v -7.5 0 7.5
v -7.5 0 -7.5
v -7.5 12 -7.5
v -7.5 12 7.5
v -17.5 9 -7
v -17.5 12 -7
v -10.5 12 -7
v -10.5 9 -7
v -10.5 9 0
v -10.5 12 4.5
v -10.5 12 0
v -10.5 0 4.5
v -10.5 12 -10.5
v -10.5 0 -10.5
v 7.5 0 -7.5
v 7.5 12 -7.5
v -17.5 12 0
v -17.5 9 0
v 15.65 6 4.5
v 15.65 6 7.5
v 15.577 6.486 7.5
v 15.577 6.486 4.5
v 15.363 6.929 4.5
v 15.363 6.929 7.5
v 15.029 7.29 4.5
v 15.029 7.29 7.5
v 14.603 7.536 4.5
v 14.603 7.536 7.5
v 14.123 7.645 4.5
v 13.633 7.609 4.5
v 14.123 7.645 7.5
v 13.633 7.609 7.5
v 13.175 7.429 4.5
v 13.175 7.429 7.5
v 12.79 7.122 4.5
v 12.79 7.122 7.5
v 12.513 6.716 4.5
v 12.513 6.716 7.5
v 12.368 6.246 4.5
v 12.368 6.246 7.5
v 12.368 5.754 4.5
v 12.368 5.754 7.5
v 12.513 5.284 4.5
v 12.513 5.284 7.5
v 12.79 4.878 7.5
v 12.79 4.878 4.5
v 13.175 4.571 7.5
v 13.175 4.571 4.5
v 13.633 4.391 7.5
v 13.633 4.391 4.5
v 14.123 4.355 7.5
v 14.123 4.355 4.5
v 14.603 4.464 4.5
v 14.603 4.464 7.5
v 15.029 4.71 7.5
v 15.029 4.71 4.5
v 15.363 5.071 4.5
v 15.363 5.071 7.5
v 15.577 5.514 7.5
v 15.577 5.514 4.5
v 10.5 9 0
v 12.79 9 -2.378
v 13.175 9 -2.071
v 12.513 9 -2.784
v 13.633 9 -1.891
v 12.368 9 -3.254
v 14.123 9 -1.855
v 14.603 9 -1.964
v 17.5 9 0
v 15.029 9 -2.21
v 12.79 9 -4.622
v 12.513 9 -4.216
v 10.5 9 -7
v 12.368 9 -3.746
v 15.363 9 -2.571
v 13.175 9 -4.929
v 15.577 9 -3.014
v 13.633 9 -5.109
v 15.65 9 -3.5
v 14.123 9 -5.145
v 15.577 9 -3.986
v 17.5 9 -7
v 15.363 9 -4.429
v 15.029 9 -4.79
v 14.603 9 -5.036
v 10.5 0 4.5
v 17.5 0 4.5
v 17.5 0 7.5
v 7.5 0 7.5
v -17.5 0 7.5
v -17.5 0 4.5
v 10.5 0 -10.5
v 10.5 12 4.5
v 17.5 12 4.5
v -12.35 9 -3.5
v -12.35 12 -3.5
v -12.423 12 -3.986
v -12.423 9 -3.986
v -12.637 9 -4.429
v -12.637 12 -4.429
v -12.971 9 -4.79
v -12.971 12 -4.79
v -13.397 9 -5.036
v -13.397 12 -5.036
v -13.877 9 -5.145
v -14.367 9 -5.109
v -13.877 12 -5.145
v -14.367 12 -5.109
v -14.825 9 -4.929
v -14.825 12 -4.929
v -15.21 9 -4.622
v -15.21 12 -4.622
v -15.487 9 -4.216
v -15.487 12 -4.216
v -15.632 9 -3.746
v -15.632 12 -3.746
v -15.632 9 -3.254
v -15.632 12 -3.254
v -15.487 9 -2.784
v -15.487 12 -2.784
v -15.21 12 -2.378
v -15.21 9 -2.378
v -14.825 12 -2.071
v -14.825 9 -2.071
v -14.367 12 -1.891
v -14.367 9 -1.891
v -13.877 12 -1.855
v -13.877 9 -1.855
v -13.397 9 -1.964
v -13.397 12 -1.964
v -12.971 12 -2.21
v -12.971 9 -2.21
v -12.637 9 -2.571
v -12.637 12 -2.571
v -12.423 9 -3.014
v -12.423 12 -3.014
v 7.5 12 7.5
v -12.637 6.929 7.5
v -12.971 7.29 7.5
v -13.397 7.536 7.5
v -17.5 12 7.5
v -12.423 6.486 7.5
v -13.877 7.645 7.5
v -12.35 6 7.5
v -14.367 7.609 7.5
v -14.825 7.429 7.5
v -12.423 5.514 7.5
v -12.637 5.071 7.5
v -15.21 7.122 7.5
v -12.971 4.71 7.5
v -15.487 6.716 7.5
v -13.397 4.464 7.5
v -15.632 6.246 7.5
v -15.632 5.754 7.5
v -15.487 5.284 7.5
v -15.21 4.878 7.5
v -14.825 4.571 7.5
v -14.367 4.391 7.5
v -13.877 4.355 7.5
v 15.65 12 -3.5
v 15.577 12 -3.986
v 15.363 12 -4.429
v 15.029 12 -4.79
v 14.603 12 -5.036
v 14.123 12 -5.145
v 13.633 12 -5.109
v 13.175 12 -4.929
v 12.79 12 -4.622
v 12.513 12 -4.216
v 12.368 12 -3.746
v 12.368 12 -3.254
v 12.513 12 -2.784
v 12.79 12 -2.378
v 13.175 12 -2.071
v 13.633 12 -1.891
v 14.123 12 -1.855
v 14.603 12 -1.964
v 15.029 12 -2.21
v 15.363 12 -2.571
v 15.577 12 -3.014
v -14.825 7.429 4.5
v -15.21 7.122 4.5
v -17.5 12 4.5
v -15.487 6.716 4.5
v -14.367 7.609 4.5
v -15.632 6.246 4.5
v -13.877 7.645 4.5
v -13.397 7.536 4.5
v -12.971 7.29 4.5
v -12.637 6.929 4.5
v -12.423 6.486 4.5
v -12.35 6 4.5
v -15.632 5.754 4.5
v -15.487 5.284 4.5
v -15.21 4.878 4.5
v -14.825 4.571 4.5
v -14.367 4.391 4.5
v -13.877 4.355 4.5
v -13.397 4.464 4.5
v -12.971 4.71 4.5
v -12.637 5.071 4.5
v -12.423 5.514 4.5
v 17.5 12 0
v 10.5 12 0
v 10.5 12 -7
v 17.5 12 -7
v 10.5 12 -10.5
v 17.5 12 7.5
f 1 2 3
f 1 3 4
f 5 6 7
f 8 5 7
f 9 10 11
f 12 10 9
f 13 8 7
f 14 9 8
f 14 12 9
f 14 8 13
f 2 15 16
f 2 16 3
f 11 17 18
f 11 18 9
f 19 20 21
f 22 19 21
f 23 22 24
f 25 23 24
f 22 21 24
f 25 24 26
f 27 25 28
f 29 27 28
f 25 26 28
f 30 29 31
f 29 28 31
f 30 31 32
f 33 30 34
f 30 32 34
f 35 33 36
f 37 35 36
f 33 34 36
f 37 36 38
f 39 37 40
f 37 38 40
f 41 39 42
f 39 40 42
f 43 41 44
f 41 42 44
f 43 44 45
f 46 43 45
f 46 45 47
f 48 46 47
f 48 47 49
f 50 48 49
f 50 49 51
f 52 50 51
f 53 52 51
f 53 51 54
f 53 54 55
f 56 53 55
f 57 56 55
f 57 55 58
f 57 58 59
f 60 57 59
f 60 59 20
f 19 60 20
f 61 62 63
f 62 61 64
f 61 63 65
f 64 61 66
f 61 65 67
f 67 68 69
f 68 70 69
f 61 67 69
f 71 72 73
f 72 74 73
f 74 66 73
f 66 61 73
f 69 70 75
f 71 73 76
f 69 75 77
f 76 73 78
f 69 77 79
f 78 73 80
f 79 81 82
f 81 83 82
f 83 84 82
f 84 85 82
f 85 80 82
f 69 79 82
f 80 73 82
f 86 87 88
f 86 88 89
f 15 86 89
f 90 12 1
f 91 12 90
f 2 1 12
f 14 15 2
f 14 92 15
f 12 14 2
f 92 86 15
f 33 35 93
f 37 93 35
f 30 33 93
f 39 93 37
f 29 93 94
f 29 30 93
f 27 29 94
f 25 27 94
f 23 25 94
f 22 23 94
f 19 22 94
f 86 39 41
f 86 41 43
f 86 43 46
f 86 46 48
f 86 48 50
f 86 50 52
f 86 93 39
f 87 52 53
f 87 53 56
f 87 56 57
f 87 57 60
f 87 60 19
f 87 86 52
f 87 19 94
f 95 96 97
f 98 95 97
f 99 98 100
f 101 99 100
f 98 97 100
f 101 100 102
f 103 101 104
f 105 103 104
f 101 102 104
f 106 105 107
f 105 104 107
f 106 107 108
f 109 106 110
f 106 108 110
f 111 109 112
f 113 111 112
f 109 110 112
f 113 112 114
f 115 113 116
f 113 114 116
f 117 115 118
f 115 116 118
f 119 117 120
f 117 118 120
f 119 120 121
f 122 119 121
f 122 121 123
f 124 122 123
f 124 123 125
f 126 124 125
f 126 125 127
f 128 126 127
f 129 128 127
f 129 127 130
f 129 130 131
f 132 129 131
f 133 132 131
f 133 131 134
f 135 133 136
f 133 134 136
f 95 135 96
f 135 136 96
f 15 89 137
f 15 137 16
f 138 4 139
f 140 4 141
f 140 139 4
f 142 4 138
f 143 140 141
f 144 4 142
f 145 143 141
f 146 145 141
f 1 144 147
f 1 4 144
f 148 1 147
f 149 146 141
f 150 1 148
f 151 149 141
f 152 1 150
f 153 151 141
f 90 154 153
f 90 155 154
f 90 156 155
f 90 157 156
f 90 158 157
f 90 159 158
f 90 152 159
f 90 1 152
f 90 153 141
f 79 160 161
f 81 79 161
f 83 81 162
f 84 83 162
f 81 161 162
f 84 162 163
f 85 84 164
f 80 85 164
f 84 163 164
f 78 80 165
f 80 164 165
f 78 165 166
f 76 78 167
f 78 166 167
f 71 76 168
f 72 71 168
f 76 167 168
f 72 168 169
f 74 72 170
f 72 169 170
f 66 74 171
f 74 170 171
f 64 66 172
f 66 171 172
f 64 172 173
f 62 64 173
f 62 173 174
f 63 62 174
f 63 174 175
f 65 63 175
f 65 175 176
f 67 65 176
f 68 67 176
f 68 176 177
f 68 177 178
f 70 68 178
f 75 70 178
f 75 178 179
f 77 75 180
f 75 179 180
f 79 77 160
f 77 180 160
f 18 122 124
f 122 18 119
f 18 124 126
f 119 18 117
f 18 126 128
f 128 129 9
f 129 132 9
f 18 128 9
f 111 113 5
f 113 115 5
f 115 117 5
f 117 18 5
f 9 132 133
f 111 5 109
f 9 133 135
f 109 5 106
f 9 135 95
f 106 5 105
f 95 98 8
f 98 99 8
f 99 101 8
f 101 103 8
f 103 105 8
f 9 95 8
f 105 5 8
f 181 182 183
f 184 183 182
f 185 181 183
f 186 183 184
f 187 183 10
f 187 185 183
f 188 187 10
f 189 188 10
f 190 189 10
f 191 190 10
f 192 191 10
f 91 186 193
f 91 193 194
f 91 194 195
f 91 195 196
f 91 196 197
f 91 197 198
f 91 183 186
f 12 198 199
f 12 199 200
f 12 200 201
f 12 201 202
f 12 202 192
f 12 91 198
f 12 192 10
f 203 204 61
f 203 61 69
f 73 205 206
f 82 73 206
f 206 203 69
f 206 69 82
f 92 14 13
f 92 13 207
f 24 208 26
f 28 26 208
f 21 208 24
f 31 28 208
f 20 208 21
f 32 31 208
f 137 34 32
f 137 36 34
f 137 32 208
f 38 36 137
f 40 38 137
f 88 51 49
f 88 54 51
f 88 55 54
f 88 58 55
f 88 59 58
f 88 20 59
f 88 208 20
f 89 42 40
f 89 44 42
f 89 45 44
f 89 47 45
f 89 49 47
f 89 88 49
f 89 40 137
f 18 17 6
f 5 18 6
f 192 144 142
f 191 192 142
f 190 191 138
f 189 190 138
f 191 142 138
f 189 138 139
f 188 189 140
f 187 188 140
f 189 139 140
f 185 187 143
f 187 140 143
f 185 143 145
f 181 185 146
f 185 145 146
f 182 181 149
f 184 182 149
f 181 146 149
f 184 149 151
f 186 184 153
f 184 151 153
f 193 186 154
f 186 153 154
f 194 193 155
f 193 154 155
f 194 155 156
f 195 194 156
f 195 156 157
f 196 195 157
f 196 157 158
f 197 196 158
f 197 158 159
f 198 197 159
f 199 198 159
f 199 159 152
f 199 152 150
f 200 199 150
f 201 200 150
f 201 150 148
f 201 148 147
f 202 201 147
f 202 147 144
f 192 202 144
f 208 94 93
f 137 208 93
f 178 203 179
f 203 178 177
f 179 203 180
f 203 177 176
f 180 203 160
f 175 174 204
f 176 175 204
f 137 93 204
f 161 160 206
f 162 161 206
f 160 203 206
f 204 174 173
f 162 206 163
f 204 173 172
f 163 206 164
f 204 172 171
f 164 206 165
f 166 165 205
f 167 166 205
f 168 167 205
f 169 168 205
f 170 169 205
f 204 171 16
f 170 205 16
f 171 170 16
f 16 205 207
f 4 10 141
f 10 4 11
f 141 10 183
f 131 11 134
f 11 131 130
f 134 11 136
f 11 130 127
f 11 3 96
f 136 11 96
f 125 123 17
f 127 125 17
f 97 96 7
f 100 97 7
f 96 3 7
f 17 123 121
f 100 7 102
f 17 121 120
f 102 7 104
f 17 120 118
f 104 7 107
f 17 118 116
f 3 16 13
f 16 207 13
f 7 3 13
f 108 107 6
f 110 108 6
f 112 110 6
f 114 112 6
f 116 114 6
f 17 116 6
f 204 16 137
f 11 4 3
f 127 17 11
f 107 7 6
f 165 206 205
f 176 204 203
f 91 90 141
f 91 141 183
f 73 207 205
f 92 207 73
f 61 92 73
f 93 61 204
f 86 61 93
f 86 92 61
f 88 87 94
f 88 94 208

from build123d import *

# Parameters (mm, degrees)
BOSS_EXTRUDE1_DEPTH = 12
SKETCH2_R           = 1.65
CUT_EXTRUDE1_DEPTH  = 12
SKETCH3_W           = 7
SKETCH3_H           = 7
SKETCH3_R           = 1.65
BOSS_EXTRUDE2_DEPTH = 3


with BuildPart() as part:
    # Sketch1 → Boss-Extrude1 (new body)
    with BuildSketch(Plane(origin=(0, 0, 0), x_dir=(1, 0, 0), z_dir=(0, 1, 0))):
        Polygon((7.5, -7.5), (7.5, 7.5), (-7.5, 7.5), (-7.5, -7.5), (-17.5, -7.5), (-17.5, -4.5), (-10.5, -4.5), (-10.5, 10.5), (10.5, 10.5), (10.5, -4.5), (17.5, -4.5), (17.5, -7.5), align=None)
    extrude(amount=BOSS_EXTRUDE1_DEPTH)

    # Sketch2 → Cut-Extrude1 (cut)
    with BuildSketch(Plane.XY.offset(7.5)):
        with Locations((-14, 6)):
            Circle(SKETCH2_R)
        with Locations((14, 6)):
            Circle(SKETCH2_R)
    extrude(amount=-CUT_EXTRUDE1_DEPTH, mode=Mode.SUBTRACT)

    # Sketch3 → Boss-Extrude2 (add)
    with BuildSketch(Plane(origin=(0, 12, 0), x_dir=(1, 0, 0), z_dir=(0, 1, 0))):
        with Locations((-14, 3.5)):
            Rectangle(SKETCH3_W, SKETCH3_H)
        with Locations((-14, 3.5)):
            Circle(SKETCH3_R, mode=Mode.SUBTRACT)
        with Locations((14, 3.5)):
            Rectangle(SKETCH3_W, SKETCH3_H)
        with Locations((14, 3.5)):
            Circle(SKETCH3_R, mode=Mode.SUBTRACT)
    extrude(amount=-BOSS_EXTRUDE2_DEPTH)


solid = part.part
